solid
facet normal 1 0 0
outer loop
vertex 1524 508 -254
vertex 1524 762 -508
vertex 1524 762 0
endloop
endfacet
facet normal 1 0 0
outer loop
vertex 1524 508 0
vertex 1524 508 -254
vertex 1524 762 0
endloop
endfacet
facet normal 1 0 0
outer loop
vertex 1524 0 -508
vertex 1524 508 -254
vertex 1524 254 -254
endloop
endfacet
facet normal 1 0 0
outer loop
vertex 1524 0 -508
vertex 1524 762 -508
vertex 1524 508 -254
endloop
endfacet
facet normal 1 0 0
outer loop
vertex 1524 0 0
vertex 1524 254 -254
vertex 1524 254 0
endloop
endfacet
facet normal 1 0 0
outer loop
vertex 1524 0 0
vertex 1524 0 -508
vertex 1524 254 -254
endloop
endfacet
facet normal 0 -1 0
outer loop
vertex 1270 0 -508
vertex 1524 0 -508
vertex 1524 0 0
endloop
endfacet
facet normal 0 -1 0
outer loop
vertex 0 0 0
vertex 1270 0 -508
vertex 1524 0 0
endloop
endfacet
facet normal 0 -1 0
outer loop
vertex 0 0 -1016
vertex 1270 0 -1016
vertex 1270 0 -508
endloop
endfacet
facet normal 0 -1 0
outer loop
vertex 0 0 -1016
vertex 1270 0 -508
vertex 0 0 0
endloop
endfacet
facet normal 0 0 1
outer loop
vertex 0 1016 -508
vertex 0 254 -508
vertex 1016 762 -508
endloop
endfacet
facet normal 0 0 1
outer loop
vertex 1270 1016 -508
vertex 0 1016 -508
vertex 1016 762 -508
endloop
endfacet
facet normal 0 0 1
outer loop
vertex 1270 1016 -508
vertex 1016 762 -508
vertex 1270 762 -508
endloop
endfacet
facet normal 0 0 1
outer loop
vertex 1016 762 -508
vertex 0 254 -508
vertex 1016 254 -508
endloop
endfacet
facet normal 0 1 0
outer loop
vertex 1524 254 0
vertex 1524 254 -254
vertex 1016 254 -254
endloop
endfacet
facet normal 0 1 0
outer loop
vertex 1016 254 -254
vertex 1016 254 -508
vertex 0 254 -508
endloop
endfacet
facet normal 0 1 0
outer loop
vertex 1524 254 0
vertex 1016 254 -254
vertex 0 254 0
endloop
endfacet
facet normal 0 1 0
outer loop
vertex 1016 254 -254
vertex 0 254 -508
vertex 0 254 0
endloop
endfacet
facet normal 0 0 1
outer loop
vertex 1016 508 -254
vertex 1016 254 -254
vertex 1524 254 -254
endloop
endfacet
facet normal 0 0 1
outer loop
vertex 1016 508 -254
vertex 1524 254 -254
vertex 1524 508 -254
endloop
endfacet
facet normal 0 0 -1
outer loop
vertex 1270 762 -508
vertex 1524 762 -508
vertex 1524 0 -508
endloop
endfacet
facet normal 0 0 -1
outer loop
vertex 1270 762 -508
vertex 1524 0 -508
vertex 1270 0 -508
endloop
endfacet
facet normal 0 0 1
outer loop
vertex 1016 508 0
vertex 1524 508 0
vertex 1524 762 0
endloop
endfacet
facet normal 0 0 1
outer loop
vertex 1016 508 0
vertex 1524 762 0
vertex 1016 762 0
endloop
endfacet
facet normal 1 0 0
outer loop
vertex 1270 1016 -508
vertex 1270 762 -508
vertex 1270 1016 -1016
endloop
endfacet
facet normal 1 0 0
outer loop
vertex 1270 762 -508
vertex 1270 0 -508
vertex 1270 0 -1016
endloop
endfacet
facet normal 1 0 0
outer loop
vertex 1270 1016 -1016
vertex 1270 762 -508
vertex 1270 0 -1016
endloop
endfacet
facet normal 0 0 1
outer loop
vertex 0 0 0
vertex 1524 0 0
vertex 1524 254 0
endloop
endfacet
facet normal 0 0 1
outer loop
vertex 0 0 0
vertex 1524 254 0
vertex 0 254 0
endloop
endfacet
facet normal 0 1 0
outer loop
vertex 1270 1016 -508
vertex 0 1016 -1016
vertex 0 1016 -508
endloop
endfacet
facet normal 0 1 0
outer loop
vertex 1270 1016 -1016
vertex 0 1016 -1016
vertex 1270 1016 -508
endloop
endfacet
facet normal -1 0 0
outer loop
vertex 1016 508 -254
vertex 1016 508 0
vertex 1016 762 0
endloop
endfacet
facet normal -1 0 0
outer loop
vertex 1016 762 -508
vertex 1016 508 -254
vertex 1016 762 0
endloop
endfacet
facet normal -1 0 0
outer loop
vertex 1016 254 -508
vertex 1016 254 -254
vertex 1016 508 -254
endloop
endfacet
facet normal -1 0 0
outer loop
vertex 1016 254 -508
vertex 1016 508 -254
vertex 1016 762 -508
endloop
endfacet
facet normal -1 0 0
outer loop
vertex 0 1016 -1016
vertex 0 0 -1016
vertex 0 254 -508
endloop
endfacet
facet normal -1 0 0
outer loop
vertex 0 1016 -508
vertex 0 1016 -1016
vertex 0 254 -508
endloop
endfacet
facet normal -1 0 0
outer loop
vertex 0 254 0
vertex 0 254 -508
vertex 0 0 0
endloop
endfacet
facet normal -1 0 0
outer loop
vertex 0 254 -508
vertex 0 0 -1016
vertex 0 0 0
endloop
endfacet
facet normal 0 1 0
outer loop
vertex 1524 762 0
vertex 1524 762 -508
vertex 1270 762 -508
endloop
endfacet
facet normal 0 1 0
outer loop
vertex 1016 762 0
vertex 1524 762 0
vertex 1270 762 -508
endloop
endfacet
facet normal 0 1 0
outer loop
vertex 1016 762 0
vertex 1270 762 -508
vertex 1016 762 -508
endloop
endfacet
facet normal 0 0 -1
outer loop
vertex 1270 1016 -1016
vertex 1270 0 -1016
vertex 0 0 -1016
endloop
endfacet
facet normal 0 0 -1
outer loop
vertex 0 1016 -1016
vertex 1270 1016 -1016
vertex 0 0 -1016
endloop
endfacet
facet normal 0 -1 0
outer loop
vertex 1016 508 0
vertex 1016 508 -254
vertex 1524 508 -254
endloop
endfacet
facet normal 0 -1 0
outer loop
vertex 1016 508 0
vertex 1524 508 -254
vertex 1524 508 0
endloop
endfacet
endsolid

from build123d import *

# Parameters (mm, degrees)
SKETCH1_W           = 1016
SKETCH1_H           = 508
BOSS_EXTRUDE1_DEPTH = 254
BOSS_EXTRUDE2_DEPTH = 1016
BOSS_EXTRUDE3_DEPTH = 762
SKETCH2_W           = 254
SKETCH2_H           = 254
CUT_EXTRUDE3_DEPTH  = 508


with BuildPart() as part:
    # Sketch1 → Boss-Extrude1 (new body)
    with BuildSketch(Plane(origin=(0, 0, 0), x_dir=(1, 0, 0), z_dir=(0, 1, 0))):
        with Locations((508, 254)):
            Rectangle(SKETCH1_W, SKETCH1_H)
    extrude(amount=BOSS_EXTRUDE1_DEPTH)

    # Sketch1<3> → Boss-Extrude2 (add)
    with BuildSketch(Plane(origin=(0, 0, 0), x_dir=(1, 0, 0), z_dir=(0, 1, 0))):
        Polygon((0, 1016), (0, 508), (1016, 508), (1270, 508), (1270, 1016), align=None)
    extrude(amount=BOSS_EXTRUDE2_DEPTH)

    # Sketch1<4> → Boss-Extrude3 (add)
    with BuildSketch(Plane(origin=(0, 0, 0), x_dir=(1, 0, 0), z_dir=(0, 1, 0))):
        Polygon((1016, 508), (1016, 0), (1524, 0), (1524, 508), (1270, 508), align=None)
    extrude(amount=BOSS_EXTRUDE3_DEPTH)

    # Sketch2 → Cut-Extrude3 (cut)
    with BuildSketch(Plane.ZY.offset(-1016)):
        with Locations((-127, 381)):
            Rectangle(SKETCH2_W, SKETCH2_H)
    extrude(amount=-CUT_EXTRUDE3_DEPTH, mode=Mode.SUBTRACT)


solid = part.part
